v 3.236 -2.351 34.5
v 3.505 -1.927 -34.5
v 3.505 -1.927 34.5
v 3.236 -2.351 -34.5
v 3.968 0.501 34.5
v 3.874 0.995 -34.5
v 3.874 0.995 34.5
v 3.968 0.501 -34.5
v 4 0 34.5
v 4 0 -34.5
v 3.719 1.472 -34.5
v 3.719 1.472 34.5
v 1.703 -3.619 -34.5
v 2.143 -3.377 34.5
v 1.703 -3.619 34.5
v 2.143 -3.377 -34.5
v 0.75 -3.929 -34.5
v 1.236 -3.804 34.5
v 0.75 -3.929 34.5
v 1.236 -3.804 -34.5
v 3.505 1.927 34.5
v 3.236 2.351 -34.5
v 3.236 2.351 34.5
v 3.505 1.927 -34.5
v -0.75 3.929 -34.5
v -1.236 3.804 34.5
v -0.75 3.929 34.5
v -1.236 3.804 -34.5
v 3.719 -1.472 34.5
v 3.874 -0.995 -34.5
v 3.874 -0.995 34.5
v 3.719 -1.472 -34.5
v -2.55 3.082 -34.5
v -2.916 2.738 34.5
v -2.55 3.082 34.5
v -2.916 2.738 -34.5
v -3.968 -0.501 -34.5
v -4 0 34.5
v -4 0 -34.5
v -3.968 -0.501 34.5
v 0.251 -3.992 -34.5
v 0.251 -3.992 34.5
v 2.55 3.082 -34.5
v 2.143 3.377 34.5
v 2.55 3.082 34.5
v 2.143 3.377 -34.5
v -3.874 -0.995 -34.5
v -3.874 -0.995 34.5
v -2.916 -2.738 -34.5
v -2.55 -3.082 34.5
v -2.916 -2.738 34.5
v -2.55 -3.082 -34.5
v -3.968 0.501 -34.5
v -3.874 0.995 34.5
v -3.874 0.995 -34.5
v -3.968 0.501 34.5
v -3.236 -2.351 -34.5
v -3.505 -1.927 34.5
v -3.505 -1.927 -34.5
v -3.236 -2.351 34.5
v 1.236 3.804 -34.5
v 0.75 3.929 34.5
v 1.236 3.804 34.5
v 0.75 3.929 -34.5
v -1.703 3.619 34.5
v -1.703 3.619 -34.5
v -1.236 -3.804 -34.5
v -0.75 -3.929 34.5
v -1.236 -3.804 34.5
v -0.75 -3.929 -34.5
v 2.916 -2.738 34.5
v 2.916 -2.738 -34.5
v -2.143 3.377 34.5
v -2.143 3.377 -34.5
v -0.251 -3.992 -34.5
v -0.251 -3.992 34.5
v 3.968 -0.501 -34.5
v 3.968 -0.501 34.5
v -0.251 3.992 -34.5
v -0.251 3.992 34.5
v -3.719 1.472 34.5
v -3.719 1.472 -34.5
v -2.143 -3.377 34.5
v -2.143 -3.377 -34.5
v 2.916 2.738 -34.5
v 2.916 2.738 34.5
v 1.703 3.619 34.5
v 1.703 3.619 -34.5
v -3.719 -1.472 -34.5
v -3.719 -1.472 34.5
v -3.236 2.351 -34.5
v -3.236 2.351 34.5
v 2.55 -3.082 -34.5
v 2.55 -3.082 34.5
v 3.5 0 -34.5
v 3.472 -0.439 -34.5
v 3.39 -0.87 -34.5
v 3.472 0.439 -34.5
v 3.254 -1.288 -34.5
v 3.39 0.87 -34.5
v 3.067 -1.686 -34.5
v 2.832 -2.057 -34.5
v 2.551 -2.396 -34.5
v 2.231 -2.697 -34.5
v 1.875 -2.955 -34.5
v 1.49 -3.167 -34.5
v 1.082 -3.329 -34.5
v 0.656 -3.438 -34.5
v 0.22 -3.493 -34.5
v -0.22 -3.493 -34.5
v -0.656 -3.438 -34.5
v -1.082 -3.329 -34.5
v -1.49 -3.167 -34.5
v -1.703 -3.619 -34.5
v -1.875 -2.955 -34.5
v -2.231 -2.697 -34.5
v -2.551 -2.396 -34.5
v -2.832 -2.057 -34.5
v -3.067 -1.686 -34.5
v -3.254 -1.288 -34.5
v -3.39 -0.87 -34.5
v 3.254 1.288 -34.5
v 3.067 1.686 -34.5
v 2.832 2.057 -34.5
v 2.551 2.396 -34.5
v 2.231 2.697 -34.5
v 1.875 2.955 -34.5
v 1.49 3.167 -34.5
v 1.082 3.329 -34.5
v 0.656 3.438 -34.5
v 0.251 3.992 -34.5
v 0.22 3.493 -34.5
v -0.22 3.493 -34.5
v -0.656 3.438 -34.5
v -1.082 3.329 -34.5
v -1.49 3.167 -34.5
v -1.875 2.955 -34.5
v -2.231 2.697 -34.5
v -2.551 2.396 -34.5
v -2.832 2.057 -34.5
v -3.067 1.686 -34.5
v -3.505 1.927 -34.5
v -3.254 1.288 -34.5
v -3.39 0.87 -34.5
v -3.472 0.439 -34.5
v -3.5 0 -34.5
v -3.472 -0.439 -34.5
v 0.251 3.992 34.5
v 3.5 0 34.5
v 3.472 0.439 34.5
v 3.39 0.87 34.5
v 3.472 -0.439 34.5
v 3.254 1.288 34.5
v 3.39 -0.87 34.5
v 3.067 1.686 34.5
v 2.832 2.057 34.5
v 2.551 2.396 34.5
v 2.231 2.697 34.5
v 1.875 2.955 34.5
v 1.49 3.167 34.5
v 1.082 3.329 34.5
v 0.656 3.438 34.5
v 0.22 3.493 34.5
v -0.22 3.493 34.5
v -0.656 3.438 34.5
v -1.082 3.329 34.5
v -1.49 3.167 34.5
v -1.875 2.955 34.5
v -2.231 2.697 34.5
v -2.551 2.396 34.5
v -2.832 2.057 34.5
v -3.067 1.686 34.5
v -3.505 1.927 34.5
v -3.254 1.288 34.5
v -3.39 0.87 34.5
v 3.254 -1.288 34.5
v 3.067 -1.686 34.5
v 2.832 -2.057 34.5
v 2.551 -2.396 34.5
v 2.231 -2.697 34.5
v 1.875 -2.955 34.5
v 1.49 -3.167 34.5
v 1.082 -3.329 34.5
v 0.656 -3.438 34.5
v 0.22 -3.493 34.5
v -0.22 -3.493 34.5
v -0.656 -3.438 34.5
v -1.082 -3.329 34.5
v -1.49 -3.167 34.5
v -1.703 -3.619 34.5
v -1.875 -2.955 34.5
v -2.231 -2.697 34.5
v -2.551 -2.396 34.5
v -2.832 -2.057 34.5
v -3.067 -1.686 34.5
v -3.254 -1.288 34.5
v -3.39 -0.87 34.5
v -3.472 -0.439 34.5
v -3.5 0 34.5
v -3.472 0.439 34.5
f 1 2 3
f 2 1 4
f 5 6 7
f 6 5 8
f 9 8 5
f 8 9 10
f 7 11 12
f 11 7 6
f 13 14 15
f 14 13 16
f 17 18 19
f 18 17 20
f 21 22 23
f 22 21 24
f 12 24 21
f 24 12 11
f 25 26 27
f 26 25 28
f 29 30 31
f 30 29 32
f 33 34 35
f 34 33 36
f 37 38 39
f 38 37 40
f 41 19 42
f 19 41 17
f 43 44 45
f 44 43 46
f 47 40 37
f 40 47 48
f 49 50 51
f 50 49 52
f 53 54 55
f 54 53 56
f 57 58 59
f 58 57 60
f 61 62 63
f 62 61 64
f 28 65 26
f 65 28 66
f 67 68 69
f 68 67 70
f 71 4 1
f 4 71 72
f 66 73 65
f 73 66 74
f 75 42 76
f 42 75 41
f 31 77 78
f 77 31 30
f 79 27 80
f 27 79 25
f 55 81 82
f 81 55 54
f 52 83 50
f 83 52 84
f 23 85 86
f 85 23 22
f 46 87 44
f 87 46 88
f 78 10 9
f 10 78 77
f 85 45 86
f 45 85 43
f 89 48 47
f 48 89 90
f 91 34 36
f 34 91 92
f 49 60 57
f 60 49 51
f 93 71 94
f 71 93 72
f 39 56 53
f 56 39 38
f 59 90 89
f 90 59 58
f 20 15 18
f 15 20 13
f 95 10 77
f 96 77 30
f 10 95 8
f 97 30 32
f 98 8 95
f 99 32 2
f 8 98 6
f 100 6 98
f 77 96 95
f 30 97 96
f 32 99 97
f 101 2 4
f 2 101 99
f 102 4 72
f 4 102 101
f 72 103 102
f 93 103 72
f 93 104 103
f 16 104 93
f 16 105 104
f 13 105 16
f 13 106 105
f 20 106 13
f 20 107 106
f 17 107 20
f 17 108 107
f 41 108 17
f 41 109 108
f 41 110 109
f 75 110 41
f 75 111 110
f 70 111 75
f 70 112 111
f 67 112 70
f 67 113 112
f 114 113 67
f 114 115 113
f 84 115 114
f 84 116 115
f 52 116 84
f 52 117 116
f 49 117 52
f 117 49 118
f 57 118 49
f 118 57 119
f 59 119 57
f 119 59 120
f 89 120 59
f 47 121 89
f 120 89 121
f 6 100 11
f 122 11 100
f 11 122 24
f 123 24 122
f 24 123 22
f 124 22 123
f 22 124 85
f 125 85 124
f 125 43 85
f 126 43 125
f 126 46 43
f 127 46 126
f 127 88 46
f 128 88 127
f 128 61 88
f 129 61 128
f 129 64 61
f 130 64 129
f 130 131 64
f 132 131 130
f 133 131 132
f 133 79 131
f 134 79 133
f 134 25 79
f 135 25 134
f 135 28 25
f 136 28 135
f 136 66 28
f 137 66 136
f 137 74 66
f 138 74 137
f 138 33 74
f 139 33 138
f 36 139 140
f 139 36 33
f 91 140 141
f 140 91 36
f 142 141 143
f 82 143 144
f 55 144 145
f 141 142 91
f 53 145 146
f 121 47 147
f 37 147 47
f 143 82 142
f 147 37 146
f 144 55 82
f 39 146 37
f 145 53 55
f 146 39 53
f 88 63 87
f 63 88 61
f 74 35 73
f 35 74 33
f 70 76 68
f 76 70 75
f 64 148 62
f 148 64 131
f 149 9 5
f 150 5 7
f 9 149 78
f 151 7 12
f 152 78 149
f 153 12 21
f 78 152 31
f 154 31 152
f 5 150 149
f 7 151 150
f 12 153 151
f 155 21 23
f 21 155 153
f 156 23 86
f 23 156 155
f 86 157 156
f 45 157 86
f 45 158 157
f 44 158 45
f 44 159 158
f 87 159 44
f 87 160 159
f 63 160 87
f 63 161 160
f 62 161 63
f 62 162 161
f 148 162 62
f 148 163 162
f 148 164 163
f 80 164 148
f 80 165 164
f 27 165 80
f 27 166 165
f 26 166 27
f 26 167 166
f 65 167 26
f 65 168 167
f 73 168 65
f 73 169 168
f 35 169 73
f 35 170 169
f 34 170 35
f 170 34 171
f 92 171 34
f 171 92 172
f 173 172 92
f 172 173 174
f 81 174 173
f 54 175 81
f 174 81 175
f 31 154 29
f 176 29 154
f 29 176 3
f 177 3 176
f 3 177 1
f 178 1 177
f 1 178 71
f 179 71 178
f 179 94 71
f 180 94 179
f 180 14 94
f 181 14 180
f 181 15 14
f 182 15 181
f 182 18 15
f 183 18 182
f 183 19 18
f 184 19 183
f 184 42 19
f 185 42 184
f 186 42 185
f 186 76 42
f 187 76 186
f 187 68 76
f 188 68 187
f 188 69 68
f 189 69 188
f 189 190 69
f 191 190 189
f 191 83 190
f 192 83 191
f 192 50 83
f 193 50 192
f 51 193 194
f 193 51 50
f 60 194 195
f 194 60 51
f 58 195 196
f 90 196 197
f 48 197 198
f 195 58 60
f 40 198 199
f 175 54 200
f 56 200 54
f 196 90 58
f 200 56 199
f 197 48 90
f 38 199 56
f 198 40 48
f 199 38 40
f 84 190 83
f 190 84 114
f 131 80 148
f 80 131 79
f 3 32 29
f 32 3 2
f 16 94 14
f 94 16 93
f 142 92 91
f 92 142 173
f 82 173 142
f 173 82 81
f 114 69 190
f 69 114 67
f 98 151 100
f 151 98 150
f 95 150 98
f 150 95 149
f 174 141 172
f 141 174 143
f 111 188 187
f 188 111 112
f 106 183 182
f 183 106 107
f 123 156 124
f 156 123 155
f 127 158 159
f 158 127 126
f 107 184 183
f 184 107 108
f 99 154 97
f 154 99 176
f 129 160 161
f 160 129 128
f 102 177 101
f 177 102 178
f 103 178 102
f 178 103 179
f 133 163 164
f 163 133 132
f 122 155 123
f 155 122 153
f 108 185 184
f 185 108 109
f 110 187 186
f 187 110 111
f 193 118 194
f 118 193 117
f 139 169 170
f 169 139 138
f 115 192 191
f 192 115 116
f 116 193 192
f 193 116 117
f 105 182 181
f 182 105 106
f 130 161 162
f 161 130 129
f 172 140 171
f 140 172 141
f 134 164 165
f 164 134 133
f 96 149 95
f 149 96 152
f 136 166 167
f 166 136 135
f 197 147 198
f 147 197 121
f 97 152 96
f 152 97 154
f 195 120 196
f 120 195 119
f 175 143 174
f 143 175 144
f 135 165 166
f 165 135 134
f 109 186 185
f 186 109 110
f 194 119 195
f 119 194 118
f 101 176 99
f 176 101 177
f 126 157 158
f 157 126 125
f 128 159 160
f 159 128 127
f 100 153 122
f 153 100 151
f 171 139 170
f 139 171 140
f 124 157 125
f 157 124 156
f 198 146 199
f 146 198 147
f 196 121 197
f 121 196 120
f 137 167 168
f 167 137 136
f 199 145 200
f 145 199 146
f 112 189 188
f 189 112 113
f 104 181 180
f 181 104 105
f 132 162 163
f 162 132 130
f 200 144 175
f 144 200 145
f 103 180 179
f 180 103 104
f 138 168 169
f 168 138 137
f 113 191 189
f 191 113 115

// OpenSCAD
$fn = 50;


difference() {
	union() {
		translate(v = [0, 0, -34.5000000000]) {
			cylinder(h = 69, r = 4.0000000000);
		}
	}
	union() {
		translate(v = [0, 0, -100.0000000000]) {
			cylinder(h = 200, r = 3.5000000000);
		}
	}
}
